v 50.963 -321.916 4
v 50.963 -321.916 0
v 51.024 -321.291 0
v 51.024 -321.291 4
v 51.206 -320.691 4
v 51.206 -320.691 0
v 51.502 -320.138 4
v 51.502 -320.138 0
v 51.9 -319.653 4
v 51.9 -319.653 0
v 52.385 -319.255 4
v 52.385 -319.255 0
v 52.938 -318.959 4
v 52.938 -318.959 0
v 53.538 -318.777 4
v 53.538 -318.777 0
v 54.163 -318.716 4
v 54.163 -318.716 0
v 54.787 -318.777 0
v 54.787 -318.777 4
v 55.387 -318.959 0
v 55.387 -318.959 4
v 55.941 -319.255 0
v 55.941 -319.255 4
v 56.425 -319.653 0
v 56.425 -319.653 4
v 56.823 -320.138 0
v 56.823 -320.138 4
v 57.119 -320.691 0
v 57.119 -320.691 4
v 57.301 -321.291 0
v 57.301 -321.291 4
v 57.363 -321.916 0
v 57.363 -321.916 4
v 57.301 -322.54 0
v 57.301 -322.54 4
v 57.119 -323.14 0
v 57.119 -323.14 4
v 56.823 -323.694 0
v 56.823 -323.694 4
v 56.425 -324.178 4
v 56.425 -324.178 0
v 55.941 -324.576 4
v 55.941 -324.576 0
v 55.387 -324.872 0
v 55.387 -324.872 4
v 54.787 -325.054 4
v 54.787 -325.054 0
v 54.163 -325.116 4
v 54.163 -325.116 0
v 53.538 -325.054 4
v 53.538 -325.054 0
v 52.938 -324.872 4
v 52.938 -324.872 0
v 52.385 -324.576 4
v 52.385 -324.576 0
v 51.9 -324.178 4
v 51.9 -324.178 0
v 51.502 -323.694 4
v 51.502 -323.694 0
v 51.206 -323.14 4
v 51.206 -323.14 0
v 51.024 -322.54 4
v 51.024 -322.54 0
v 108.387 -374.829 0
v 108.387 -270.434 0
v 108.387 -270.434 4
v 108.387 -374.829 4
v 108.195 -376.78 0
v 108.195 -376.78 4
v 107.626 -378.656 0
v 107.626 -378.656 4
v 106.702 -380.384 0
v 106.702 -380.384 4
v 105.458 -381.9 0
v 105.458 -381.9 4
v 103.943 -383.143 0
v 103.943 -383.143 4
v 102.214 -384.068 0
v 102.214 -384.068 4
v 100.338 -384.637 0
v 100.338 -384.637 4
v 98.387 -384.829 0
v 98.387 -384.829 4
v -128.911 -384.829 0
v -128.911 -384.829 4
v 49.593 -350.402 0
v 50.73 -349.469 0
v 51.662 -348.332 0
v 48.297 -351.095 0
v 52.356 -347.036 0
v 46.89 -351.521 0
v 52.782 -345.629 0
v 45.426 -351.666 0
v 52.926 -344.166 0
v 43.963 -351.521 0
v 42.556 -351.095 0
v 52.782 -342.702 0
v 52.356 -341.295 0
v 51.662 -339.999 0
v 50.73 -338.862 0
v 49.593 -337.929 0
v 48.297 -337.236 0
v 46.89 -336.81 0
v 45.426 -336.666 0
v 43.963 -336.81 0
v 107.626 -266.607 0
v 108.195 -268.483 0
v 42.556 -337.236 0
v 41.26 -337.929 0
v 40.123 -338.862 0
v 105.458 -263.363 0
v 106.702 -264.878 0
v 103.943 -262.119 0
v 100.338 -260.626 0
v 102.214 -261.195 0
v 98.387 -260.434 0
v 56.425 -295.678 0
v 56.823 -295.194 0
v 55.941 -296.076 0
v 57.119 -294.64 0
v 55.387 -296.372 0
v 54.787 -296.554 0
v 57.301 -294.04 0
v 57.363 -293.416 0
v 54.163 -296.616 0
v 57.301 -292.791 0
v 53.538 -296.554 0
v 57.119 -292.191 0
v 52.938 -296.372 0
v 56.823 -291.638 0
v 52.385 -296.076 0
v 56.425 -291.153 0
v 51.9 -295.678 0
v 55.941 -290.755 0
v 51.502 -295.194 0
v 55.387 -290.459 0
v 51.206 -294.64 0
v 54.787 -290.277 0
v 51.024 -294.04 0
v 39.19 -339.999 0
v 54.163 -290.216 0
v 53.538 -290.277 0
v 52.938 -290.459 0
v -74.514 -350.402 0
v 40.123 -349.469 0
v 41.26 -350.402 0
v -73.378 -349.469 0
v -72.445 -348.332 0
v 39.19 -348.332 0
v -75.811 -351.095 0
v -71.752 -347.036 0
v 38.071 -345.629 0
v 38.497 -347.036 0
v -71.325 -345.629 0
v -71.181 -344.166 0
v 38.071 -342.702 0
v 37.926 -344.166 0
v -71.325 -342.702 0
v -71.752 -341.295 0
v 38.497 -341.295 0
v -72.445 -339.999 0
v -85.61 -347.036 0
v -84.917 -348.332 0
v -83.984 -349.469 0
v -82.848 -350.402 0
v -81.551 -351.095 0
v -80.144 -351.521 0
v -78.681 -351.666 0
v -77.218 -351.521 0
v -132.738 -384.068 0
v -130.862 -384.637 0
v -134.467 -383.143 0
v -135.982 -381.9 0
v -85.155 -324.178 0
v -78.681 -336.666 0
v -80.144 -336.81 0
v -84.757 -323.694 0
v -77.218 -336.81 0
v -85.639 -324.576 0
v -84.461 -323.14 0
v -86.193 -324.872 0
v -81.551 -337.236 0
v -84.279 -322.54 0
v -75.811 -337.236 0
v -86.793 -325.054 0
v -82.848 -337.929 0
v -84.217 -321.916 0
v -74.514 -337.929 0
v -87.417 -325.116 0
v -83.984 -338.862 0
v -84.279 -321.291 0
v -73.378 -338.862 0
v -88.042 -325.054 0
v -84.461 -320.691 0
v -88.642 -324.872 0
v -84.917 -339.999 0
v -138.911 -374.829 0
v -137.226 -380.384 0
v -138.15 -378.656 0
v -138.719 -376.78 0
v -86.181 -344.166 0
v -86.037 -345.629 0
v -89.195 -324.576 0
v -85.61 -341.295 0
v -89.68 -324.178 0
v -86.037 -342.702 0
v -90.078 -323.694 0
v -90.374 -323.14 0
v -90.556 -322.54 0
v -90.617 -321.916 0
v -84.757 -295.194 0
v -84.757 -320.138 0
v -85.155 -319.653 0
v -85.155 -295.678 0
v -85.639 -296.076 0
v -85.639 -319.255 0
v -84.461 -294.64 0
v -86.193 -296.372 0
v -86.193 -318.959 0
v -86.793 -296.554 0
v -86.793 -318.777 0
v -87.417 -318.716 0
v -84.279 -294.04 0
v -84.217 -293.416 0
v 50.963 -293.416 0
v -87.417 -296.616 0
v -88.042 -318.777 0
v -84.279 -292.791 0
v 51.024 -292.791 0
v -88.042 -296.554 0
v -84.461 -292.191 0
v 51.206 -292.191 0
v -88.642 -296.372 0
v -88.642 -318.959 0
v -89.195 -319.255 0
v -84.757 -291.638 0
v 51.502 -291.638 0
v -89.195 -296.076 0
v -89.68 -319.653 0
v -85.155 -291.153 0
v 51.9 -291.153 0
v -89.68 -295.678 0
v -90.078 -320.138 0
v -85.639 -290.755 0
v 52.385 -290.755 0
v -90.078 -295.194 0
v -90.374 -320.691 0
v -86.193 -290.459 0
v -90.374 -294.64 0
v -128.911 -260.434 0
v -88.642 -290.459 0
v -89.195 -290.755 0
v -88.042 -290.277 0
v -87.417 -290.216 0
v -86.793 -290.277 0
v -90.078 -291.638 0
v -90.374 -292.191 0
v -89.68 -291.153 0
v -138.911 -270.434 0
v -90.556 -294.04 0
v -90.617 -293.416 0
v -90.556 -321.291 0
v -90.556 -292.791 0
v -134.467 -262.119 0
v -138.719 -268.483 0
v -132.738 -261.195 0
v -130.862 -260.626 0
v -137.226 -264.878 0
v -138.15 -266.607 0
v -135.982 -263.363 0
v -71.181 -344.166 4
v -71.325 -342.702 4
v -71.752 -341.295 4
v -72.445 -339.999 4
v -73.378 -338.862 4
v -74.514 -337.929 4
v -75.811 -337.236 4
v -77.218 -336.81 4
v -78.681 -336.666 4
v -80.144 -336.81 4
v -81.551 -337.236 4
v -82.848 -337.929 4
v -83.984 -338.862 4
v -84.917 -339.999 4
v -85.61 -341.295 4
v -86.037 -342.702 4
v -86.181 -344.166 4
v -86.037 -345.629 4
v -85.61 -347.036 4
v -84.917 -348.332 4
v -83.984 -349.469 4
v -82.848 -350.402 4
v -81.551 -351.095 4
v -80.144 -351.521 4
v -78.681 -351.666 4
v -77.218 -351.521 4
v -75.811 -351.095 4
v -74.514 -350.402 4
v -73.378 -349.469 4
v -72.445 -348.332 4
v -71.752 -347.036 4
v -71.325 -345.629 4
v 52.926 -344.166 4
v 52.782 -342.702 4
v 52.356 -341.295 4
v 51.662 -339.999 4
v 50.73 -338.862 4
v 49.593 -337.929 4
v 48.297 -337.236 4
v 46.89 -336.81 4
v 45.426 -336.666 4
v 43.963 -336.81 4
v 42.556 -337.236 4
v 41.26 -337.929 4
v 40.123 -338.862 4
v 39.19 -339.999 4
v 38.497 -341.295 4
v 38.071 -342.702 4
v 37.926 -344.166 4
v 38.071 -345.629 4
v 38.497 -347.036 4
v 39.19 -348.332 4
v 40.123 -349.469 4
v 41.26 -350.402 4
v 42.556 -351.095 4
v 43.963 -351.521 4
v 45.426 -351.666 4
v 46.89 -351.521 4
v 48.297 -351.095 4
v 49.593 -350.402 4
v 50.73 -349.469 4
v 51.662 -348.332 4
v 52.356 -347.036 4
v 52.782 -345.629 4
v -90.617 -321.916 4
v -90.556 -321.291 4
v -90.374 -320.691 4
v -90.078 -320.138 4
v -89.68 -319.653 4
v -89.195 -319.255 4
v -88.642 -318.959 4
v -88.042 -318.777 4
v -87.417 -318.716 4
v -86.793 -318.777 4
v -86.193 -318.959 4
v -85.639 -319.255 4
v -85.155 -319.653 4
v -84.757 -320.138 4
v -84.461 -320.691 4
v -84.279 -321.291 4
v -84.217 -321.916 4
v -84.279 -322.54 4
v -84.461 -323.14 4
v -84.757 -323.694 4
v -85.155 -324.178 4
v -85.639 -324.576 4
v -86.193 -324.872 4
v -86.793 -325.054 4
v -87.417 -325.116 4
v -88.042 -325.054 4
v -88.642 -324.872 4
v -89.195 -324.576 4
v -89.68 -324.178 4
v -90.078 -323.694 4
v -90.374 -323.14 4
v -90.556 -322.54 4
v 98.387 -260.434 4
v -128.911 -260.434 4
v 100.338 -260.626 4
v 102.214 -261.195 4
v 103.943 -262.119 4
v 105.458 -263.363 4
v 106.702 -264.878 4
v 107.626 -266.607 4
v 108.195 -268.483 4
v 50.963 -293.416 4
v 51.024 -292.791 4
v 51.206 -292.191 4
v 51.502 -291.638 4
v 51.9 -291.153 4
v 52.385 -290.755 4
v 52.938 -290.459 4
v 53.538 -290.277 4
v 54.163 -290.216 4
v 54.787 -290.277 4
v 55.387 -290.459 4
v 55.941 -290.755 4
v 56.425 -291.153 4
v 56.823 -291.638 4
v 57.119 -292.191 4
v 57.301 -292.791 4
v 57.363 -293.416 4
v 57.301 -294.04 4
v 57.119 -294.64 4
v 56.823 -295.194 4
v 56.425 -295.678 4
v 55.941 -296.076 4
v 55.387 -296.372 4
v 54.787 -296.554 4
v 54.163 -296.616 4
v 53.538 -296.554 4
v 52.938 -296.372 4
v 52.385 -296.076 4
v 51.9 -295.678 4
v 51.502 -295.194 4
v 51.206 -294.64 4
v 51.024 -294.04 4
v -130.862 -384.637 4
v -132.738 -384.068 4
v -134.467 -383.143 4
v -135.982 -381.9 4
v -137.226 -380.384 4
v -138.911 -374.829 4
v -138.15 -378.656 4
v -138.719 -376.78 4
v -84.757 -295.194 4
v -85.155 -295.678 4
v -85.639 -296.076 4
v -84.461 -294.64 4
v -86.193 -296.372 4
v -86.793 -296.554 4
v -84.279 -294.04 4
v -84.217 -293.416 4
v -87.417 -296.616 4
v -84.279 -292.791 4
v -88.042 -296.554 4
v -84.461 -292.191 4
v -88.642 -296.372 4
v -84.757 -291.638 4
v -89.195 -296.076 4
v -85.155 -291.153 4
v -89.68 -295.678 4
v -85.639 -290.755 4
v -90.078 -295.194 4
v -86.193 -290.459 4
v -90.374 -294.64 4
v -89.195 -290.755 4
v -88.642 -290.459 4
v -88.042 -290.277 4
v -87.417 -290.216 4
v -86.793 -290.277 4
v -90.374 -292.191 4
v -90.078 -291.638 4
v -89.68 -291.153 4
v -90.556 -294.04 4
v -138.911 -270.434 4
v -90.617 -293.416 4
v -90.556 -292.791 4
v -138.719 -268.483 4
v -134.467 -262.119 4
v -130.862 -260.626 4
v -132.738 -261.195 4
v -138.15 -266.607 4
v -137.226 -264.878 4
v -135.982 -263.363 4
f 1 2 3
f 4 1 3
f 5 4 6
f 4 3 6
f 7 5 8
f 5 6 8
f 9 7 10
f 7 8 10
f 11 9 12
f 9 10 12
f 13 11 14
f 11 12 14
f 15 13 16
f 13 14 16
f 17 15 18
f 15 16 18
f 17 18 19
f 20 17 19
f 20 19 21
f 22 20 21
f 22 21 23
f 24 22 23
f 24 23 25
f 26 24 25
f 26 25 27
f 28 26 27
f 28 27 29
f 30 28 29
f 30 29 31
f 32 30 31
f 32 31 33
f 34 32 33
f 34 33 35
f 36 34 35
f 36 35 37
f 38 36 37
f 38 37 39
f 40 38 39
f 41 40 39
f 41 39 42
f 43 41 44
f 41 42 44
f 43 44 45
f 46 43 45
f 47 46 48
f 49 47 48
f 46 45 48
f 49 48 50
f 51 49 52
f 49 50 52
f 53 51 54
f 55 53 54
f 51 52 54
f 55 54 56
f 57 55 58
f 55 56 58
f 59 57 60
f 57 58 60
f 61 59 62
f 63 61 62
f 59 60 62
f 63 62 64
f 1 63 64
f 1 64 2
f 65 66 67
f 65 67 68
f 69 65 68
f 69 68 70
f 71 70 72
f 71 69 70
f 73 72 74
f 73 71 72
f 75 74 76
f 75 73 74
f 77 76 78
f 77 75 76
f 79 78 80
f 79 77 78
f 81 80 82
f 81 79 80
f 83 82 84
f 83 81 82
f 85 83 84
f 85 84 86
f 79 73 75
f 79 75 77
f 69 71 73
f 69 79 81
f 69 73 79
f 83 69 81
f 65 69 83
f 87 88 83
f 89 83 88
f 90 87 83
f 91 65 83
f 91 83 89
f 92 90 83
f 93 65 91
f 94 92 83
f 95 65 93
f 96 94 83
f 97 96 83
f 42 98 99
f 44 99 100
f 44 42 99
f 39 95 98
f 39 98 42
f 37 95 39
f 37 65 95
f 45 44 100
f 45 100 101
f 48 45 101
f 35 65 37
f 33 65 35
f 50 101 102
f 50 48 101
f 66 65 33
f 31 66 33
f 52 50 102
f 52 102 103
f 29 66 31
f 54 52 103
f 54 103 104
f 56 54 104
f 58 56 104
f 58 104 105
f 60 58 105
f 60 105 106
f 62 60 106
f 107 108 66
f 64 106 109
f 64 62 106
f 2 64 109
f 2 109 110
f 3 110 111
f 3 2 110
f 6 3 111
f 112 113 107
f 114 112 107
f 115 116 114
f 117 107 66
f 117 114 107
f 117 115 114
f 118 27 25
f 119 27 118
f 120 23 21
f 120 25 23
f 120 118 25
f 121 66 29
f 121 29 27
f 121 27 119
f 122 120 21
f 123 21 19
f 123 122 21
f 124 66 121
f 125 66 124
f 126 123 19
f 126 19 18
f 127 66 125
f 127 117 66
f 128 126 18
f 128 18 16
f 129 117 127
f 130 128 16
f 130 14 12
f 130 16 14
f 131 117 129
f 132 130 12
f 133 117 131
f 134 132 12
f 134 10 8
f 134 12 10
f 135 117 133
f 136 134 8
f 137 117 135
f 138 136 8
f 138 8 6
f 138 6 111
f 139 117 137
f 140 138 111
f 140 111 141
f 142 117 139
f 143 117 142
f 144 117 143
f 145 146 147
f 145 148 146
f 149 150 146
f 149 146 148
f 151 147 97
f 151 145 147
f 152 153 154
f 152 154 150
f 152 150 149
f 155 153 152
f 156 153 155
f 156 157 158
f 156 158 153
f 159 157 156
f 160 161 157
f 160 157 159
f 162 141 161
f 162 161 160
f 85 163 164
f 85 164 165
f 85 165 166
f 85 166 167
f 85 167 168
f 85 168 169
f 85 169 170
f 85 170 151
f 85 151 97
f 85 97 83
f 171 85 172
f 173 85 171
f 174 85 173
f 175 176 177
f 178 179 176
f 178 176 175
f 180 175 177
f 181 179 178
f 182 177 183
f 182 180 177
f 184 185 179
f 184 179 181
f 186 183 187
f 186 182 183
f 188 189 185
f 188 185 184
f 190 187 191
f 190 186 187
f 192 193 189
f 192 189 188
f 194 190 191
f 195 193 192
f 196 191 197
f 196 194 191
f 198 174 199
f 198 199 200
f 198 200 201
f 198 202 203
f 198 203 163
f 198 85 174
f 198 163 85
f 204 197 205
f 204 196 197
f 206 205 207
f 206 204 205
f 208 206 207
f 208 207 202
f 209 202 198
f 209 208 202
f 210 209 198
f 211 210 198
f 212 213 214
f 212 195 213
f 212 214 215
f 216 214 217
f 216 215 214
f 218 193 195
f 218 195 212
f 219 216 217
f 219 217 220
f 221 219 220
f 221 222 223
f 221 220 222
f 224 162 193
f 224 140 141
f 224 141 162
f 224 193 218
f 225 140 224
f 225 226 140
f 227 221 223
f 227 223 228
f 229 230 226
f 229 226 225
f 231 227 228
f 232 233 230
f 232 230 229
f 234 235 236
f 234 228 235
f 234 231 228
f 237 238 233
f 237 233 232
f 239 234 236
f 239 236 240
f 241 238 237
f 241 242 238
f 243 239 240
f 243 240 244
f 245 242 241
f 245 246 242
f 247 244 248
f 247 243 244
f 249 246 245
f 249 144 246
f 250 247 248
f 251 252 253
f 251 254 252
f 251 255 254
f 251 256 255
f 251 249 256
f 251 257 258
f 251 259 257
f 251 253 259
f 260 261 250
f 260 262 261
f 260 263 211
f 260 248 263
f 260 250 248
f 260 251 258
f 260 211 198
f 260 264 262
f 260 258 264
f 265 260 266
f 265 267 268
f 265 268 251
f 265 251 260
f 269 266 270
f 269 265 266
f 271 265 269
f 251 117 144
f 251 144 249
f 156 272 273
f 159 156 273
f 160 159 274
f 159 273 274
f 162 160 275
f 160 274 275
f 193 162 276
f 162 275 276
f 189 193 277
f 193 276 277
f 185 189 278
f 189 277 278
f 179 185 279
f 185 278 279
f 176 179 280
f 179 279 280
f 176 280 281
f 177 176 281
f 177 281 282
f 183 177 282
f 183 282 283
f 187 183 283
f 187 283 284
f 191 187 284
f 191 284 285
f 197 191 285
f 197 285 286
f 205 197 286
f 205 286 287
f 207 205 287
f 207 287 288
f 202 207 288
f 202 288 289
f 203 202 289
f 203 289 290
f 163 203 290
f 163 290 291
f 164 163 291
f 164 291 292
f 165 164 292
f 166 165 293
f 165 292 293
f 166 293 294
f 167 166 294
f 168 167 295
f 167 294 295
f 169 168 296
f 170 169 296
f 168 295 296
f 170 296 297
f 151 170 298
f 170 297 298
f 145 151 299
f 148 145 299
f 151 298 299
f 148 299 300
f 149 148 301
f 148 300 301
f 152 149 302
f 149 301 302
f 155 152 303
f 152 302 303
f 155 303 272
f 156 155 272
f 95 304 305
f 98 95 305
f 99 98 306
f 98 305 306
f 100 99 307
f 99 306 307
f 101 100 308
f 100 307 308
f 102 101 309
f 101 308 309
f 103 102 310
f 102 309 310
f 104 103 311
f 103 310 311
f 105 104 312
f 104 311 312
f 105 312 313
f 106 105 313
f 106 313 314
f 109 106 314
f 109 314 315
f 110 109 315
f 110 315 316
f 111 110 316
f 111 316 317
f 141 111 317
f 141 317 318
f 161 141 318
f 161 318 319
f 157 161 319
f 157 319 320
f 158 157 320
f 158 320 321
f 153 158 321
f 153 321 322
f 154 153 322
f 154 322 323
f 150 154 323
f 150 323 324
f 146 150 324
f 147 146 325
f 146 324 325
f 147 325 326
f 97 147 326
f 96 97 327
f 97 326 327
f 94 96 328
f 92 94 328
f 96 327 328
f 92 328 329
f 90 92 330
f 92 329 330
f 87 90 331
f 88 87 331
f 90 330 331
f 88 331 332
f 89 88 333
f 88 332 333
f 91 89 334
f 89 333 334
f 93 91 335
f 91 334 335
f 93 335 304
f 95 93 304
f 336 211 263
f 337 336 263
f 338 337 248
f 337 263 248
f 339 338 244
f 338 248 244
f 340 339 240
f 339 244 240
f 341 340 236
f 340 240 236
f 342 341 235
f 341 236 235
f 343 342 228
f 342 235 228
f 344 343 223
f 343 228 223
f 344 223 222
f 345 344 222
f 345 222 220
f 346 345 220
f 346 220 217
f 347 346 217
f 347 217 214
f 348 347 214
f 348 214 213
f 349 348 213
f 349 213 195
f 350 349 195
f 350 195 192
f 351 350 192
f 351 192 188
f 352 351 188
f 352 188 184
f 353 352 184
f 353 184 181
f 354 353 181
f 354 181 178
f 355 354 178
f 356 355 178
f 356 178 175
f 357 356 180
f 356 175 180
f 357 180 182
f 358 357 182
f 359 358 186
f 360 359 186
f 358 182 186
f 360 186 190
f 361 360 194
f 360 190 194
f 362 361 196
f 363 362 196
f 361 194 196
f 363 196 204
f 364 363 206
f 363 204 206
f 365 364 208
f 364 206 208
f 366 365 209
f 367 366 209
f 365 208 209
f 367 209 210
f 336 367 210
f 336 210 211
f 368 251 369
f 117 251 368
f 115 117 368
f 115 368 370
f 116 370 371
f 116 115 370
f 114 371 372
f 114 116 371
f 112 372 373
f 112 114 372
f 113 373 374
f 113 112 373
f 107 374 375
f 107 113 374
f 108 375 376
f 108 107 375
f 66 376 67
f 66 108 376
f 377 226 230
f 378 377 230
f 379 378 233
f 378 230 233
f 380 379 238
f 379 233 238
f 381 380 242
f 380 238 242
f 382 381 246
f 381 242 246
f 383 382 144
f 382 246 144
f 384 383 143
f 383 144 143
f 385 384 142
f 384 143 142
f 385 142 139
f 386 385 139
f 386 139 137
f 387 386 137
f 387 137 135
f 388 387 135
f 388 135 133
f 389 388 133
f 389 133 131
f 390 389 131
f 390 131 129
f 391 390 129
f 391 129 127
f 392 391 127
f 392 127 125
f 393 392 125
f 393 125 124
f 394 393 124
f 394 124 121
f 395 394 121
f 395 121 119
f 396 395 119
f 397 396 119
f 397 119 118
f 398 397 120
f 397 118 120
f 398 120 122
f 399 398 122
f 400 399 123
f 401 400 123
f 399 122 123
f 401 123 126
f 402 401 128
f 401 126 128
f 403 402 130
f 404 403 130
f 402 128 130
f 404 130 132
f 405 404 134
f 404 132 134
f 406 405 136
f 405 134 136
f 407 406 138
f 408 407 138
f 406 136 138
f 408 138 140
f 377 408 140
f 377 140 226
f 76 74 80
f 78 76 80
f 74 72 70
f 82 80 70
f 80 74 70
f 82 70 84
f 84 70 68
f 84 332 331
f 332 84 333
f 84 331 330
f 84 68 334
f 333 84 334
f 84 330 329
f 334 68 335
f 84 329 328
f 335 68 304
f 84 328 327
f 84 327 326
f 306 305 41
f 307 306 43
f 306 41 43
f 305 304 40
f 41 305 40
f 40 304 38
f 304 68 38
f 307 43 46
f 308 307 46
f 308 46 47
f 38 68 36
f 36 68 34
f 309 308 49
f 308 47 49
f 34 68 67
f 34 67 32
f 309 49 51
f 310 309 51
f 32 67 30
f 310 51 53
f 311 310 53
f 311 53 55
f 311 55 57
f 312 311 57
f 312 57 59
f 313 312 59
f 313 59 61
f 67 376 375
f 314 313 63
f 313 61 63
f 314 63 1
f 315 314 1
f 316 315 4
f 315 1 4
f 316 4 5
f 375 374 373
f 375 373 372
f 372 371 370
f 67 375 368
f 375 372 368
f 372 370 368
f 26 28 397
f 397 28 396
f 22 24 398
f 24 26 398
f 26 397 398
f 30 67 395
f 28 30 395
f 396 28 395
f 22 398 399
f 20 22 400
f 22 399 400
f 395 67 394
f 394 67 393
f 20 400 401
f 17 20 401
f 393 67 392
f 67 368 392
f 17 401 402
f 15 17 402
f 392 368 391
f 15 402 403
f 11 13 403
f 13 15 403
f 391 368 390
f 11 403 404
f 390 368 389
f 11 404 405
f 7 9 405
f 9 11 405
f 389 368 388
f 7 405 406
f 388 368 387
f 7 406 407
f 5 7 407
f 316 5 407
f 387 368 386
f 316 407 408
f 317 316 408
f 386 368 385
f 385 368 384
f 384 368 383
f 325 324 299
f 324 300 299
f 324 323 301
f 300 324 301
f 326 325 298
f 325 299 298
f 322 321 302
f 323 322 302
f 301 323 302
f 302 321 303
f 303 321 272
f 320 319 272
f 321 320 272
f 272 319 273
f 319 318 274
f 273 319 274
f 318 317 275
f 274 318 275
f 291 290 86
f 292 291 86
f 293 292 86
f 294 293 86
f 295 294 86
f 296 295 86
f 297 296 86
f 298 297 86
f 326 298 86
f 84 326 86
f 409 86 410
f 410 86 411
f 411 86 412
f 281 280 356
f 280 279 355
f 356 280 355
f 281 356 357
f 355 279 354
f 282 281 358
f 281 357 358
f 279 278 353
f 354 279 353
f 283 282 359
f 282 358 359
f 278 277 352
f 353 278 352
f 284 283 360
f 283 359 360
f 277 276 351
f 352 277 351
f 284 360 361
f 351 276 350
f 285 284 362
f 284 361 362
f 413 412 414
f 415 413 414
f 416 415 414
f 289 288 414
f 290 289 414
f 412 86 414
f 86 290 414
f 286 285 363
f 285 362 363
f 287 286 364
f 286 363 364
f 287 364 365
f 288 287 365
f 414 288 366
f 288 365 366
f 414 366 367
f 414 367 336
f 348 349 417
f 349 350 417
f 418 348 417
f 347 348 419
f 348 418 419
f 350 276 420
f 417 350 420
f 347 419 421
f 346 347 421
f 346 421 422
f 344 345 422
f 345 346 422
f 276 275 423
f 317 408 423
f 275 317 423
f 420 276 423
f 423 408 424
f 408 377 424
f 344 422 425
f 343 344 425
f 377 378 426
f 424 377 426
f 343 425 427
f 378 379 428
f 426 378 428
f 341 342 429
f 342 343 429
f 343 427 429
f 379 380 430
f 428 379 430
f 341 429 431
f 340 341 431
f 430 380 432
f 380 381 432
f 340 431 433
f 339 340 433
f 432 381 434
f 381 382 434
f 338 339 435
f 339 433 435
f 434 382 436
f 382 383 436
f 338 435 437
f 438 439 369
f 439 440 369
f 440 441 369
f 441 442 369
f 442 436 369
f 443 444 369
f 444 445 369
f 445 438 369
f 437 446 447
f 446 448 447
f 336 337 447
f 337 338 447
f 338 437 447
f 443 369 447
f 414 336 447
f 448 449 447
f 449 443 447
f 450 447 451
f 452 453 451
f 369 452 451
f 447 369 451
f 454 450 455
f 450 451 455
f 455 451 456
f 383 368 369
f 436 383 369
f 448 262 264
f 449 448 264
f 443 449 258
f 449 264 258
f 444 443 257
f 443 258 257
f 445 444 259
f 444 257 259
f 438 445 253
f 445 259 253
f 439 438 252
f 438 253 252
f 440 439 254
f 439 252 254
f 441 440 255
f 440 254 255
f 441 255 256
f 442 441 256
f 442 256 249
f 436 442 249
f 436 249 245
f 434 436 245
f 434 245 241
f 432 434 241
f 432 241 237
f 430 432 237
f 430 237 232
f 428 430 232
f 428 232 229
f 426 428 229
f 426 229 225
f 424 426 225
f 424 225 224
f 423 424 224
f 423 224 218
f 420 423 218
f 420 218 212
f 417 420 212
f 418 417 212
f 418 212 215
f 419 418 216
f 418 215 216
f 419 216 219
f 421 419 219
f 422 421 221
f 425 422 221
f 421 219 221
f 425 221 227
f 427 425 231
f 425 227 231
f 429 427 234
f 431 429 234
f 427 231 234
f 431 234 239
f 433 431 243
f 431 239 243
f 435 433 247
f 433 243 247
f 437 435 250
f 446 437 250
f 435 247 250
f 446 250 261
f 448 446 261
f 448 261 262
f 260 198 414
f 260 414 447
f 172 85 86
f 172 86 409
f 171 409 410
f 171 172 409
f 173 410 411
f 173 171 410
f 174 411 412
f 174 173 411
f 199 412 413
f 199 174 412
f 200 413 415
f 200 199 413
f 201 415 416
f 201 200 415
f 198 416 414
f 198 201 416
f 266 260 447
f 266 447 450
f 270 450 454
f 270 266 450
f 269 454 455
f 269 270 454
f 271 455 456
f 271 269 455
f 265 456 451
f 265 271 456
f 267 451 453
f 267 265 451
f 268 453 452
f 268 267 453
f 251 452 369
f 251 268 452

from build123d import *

# Parameters (mm, degrees)
BOSS_EXTRUDE1_DEPTH  = 4
M6_CLEARANCE_HOLE1_D = 6.4
SKETCH5_R            = 7.5
CUT_EXTRUDE1_DEPTH   = 40.678061403


with BuildPart() as part:
    # Sketch1 → Boss-Extrude1 (new body)
    with BuildSketch(Plane.XY):
        with BuildLine():
            Line((98.386811049, -384.8287802), (-128.910956341, -384.8287802))
            ThreePointArc((-128.910956341, -384.8287802), (-135.982024153, -381.899848012), (-138.910956341, -374.8287802))
            Line((-138.910956341, -374.8287802), (-138.910956341, -270.434125192))
            ThreePointArc((-138.910956341, -270.434125192), (-135.982024153, -263.36305738), (-128.910956341, -260.434125192))
            Line((-128.910956341, -260.434125192), (98.386811049, -260.434125192))
            ThreePointArc((98.386811049, -260.434125192), (105.457878861, -263.36305738), (108.386811049, -270.434125192))
            Line((108.386811049, -270.434125192), (108.386811049, -374.8287802))
            ThreePointArc((108.386811049, -374.8287802), (105.457878861, -381.899848012), (98.386811049, -384.8287802))
        make_face()
    extrude(amount=BOSS_EXTRUDE1_DEPTH)

    # M6 Clearance Hole1 (through all)
    with Locations(Plane.XY.offset(4)):
        with Locations((54.16270611, -293.415681156), (54.16270611, -321.915681156), (45.426427008, -344.165502047), (-78.681014788, -344.165502047), (-87.41729389, -321.915681156), (-87.41729389, -293.415681156)):
            Hole(M6_CLEARANCE_HOLE1_D / 2)

    # Sketch5 → Cut-Extrude1 (cut)
    with BuildSketch(Plane.XY.offset(4)):
        with Locations((-78.681014788, -344.165502047)):
            Circle(SKETCH5_R)
        with Locations((45.426427008, -344.165502047)):
            Circle(SKETCH5_R)
    extrude(amount=-CUT_EXTRUDE1_DEPTH, mode=Mode.SUBTRACT)


solid = part.part
